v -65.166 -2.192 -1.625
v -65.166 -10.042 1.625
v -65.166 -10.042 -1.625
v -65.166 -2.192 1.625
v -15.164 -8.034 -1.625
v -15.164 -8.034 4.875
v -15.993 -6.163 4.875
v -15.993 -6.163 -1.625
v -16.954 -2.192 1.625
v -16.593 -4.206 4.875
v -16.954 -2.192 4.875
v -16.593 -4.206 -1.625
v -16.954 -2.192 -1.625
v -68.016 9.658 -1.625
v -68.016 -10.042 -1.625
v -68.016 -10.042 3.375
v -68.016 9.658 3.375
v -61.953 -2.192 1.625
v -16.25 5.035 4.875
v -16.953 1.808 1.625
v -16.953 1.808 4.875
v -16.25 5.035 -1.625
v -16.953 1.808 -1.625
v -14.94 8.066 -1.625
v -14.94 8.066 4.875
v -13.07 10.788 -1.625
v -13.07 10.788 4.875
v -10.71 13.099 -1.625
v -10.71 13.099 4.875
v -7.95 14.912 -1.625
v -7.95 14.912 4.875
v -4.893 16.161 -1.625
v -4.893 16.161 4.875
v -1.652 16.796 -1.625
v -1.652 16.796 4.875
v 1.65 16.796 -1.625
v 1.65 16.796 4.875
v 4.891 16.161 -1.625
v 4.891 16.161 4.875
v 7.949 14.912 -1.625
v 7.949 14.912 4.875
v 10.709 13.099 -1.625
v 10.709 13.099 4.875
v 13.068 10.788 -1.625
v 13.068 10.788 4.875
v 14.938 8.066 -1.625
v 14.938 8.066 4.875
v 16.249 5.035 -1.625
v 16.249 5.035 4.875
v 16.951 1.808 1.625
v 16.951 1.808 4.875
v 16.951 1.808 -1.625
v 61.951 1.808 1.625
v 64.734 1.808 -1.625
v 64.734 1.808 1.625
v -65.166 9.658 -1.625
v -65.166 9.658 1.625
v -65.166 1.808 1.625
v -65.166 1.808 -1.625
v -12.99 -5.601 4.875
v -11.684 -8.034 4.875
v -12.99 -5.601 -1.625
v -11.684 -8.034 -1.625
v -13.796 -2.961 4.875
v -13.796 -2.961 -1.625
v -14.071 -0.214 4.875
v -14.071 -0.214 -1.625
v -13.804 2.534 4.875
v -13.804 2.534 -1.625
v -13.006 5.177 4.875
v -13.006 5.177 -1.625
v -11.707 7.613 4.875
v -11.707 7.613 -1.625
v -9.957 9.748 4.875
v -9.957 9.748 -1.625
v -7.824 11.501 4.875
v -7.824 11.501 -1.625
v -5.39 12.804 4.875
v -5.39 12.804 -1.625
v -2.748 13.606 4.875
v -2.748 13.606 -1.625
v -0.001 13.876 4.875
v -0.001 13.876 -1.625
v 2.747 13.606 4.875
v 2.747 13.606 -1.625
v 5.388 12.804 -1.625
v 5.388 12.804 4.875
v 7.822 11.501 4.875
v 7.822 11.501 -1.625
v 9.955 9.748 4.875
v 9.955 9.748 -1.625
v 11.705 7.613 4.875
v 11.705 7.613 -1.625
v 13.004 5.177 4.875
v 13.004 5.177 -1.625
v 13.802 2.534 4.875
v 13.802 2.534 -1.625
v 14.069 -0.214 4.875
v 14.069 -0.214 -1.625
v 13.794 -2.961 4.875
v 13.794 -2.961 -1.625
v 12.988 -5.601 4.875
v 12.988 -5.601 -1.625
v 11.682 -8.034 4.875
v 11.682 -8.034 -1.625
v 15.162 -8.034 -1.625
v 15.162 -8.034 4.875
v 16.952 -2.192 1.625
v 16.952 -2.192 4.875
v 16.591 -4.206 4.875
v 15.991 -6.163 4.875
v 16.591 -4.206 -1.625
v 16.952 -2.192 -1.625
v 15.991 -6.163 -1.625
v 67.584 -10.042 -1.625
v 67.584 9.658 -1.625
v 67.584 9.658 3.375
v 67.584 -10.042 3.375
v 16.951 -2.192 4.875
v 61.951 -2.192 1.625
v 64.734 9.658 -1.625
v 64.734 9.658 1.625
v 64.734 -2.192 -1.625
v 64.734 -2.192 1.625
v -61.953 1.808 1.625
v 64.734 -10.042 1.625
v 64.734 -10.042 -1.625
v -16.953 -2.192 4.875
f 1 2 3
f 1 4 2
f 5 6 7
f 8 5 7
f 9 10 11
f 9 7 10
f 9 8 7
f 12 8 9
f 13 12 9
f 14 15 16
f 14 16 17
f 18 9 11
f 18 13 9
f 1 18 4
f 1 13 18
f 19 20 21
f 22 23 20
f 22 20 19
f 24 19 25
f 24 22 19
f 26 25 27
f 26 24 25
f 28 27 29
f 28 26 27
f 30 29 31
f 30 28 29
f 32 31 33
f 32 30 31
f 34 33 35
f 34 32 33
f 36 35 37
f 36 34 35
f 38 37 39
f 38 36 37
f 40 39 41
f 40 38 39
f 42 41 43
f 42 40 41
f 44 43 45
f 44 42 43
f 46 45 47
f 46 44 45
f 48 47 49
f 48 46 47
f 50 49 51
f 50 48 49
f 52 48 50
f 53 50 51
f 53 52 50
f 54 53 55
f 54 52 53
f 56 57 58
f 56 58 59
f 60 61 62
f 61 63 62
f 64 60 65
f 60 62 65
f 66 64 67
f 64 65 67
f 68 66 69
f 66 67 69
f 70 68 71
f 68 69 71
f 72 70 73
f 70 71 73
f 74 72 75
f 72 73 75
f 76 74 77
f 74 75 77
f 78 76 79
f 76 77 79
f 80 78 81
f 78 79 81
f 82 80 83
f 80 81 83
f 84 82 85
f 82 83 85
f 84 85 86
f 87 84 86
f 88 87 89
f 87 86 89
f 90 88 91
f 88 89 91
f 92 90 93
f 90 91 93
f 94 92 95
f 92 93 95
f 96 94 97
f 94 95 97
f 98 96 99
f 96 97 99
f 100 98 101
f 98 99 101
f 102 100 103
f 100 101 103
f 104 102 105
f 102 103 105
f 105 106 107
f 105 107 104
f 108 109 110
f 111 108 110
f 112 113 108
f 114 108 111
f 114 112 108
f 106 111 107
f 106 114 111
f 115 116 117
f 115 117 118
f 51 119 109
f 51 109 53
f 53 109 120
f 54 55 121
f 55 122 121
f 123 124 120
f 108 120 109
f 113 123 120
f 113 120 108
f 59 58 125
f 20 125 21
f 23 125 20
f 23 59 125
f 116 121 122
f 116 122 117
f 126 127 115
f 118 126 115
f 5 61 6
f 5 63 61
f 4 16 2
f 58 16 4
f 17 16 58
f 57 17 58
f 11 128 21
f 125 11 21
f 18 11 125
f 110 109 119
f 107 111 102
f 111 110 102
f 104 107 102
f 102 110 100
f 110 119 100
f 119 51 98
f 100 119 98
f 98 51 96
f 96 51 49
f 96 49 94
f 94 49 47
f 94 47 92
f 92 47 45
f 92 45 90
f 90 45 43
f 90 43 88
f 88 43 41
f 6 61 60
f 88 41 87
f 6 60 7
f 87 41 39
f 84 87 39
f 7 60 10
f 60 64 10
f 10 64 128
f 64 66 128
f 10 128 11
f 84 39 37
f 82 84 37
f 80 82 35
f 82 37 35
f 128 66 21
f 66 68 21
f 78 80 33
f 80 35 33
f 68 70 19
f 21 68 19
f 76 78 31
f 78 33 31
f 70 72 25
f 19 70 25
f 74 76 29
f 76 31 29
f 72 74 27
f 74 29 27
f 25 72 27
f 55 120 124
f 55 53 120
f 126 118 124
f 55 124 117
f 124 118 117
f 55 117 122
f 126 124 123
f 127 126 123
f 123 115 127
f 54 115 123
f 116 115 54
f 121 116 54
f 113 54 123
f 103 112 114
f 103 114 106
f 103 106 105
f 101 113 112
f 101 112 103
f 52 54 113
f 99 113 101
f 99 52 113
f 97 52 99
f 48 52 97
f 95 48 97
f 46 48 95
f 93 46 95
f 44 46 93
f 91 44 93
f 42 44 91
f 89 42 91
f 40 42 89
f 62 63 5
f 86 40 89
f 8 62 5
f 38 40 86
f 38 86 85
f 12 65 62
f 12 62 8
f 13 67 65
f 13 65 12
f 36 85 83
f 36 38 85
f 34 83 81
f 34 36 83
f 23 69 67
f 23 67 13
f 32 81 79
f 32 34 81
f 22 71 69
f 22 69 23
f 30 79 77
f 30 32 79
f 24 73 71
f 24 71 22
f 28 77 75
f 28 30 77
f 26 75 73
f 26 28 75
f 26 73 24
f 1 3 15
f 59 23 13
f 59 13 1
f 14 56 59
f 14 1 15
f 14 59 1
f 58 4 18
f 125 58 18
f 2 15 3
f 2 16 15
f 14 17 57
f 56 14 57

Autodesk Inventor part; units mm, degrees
ref_plane "YZ Plane" through (0, 0, 0) normal (1, 0, 0) x (0, 1, 0)
ref_plane "XZ Plane" through (0, 0, 0) normal (0, 1, 0) x (-1, 0, 0)
ref_plane "XY Plane" through (0, 0, 0) normal (0, 0, 1) x (1, 0, 0)
sketch "Skizze1" plane through (0, 0, 0) normal (0, 0, 1) x (1, 0, 0)
  line L0 (-68.016, 1.808) -> (67.584, 1.808)
  line L1 (67.584, 1.808) -> (67.584, -2.192)
  line L2 (67.584, -2.192) -> (-68.016, -2.192)
  line L3 (-68.016, -2.192) -> (-68.016, 1.808)
  line L4 (-68.016, 1.808) -> (67.584, -2.192) construction
  line L5 (67.584, 1.808) -> (-68.016, -2.192) construction
  point P0 (0, 0)
  point P1 (-0.216, -0.192)
  point P2 (-0.216, -0.192)
  dimension "d0" = 135.6
  dimension "d1" = 4
extrude "Extrusion1" add sketch "Skizze1" along normal mid plane 3.25
ref_plane "Arbeitsebene1" through (-68.016, -0.192, 1.625) normal (0, -1, 0) x (1, 0, 0)
sketch "Skizze2" plane through (-68.016, -0.192, 1.625) normal (0, -1, 0) x (1, 0, 0)
  line L0 (0, -3.25) -> (0, 0) projected
  line L1 (0, -3.25) -> (135.6, -3.25) projected
  line L2 (0, 0) -> (2.85, 0)
  line L3 (2.85, 0) -> (2.85, -3.25)
  line L4 (2.85, -3.25) -> (0, -3.25)
  line L5 (0, -3.25) -> (0, 0)
  line L6 (0, 0) -> (0, 1.75)
  line L7 (0, 1.75) -> (2.85, 0)
  line L8 (135.6, -3.25) -> (135.6, 0) projected
  line L9 (135.6, 0) -> (132.75, 0)
  line L10 (132.75, 0) -> (132.75, -3.25)
  line L11 (132.75, -3.25) -> (135.6, -3.25)
  line L12 (135.6, -3.25) -> (135.6, 0)
  line L13 (135.6, 0) -> (135.6, 1.75)
  line L14 (135.6, 1.75) -> (132.75, 0)
  point P0 (68.016, -1.625)
  dimension "d4" = 2.85
  dimension "d5" = 1.75
  dimension "d6" = 2.85
extrude "Extrusion2" add sketch "Skizze2" along normal mid plane 19.7
sketch "Skizze3" plane through (0, 0, 1.625) normal (0, 0, 1) x (1, 0, 0)
  circle A0 centre (0, 0) radius 16
  dimension "d9" = 32
extrude "Extrusion3" cut sketch "Skizze3" against normal through all
sketch "Skizze4" plane through (0, 0, -1.625) normal (0, 0, -1) x (-1, 0, 0)
  line L0 (0.0777, -0.1628) -> (6.2277, -0.1628) construction
  circle A0 centre (0.0009, -0.1935) radius 14.07
  circle A1 centre (0.0009, -0.1935) radius 17.07
  line L1 (-24.5991, -8.0335) -> (24.6009, -8.0335)
  point P0 (-17.0691, -0.1935)
  point P1 (17.0709, -0.1935)
  point P2 (11.6842, -8.0335)
  point P3 (15.164, -8.0335)
  point P4 (-15.1622, -8.0335)
  point P5 (-11.6824, -8.0335)
  dimension "d27" = 3
  dimension "d28" = 28.14
  dimension "d29" = 7.84
extrude "Extrusion4" add sketch "Skizze4" against normal blind 6.5 contours A0 L1 A1 picked at (15.9061, 1.1659)
sketch "Skizze7" plane through (0, 0, 1.625) normal (0, 0, 1) x (1, 0, 0)
  line L0 (-65.166, 1.808) -> (-16.9531, 1.808) projected
  line L1 (-16.9535, -2.192) -> (-65.166, -2.192) projected
  line L2 (-16.9531, 1.808) -> (-61.9531, 1.808)
  line L3 (-61.9531, 1.808) -> (-61.9531, -2.192)
  line L4 (-61.9531, -2.192) -> (-16.9531, -2.192)
  line L5 (-16.9531, -2.192) -> (-16.9531, 1.808)
  line L6 (16.9514, 1.808) -> (64.734, 1.808) projected
  line L7 (64.734, -2.192) -> (16.9517, -2.192) projected
  line L8 (16.9514, 1.808) -> (61.9514, 1.808)
  line L9 (61.9514, 1.808) -> (61.9514, -2.192)
  line L10 (61.9514, -2.192) -> (16.9514, -2.192)
  line L11 (16.9514, -2.192) -> (16.9514, 1.808)
  point P0 (0, 0)
  point P1 (16.9517, -2.192)
  dimension "d30" = 45
  dimension "d31" = 45
extrude "Extrusion7" add sketch "Skizze7" along normal blind 3.25
sketch "Skizze8" plane through (-65.166, -2.192, -1.625) normal (0, -1, 0) x (1, 0, 0)
  line L0 (48.2128, 6.5) -> (3.2128, 6.5) projected
  line L1 (48.2128, 6.5) -> (48.2128, 0) projected
  line L2 (3.2128, 6.5) -> (48.2128, 6.5)
  line L3 (48.2128, 6.5) -> (48.2128, 3.25)
  line L4 (48.2128, 3.25) -> (3.2128, 3.25)
  line L5 (3.2128, 3.25) -> (3.2128, 6.5)
  line L6 (127.1173, 3.25) -> (127.1173, 6.5) projected
  line L7 (82.1173, 6.5) -> (82.1173, 0) projected
  line L8 (127.1173, 6.5) -> (82.1173, 6.5)
  line L9 (82.1173, 6.5) -> (82.1173, 3.25)
  line L10 (82.1173, 3.25) -> (127.1173, 3.25)
  line L11 (127.1173, 3.25) -> (127.1173, 6.5)
  line L12 (82.1173, 6.5) -> (127.1173, 3.25)
  line L13 (50.002, 6.5) -> (48.2125, 6.5) projected
  line L14 (48.2125, 6.5) -> (3.2128, 3.25)
  point P0 (65.166, 1.625)
extrude "Extrusion8" cut sketch "Skizze8" against normal through all contours L14 L5 L0 | L12 L8 L6
properties part number "2024_08_23_Holder_GL25"
